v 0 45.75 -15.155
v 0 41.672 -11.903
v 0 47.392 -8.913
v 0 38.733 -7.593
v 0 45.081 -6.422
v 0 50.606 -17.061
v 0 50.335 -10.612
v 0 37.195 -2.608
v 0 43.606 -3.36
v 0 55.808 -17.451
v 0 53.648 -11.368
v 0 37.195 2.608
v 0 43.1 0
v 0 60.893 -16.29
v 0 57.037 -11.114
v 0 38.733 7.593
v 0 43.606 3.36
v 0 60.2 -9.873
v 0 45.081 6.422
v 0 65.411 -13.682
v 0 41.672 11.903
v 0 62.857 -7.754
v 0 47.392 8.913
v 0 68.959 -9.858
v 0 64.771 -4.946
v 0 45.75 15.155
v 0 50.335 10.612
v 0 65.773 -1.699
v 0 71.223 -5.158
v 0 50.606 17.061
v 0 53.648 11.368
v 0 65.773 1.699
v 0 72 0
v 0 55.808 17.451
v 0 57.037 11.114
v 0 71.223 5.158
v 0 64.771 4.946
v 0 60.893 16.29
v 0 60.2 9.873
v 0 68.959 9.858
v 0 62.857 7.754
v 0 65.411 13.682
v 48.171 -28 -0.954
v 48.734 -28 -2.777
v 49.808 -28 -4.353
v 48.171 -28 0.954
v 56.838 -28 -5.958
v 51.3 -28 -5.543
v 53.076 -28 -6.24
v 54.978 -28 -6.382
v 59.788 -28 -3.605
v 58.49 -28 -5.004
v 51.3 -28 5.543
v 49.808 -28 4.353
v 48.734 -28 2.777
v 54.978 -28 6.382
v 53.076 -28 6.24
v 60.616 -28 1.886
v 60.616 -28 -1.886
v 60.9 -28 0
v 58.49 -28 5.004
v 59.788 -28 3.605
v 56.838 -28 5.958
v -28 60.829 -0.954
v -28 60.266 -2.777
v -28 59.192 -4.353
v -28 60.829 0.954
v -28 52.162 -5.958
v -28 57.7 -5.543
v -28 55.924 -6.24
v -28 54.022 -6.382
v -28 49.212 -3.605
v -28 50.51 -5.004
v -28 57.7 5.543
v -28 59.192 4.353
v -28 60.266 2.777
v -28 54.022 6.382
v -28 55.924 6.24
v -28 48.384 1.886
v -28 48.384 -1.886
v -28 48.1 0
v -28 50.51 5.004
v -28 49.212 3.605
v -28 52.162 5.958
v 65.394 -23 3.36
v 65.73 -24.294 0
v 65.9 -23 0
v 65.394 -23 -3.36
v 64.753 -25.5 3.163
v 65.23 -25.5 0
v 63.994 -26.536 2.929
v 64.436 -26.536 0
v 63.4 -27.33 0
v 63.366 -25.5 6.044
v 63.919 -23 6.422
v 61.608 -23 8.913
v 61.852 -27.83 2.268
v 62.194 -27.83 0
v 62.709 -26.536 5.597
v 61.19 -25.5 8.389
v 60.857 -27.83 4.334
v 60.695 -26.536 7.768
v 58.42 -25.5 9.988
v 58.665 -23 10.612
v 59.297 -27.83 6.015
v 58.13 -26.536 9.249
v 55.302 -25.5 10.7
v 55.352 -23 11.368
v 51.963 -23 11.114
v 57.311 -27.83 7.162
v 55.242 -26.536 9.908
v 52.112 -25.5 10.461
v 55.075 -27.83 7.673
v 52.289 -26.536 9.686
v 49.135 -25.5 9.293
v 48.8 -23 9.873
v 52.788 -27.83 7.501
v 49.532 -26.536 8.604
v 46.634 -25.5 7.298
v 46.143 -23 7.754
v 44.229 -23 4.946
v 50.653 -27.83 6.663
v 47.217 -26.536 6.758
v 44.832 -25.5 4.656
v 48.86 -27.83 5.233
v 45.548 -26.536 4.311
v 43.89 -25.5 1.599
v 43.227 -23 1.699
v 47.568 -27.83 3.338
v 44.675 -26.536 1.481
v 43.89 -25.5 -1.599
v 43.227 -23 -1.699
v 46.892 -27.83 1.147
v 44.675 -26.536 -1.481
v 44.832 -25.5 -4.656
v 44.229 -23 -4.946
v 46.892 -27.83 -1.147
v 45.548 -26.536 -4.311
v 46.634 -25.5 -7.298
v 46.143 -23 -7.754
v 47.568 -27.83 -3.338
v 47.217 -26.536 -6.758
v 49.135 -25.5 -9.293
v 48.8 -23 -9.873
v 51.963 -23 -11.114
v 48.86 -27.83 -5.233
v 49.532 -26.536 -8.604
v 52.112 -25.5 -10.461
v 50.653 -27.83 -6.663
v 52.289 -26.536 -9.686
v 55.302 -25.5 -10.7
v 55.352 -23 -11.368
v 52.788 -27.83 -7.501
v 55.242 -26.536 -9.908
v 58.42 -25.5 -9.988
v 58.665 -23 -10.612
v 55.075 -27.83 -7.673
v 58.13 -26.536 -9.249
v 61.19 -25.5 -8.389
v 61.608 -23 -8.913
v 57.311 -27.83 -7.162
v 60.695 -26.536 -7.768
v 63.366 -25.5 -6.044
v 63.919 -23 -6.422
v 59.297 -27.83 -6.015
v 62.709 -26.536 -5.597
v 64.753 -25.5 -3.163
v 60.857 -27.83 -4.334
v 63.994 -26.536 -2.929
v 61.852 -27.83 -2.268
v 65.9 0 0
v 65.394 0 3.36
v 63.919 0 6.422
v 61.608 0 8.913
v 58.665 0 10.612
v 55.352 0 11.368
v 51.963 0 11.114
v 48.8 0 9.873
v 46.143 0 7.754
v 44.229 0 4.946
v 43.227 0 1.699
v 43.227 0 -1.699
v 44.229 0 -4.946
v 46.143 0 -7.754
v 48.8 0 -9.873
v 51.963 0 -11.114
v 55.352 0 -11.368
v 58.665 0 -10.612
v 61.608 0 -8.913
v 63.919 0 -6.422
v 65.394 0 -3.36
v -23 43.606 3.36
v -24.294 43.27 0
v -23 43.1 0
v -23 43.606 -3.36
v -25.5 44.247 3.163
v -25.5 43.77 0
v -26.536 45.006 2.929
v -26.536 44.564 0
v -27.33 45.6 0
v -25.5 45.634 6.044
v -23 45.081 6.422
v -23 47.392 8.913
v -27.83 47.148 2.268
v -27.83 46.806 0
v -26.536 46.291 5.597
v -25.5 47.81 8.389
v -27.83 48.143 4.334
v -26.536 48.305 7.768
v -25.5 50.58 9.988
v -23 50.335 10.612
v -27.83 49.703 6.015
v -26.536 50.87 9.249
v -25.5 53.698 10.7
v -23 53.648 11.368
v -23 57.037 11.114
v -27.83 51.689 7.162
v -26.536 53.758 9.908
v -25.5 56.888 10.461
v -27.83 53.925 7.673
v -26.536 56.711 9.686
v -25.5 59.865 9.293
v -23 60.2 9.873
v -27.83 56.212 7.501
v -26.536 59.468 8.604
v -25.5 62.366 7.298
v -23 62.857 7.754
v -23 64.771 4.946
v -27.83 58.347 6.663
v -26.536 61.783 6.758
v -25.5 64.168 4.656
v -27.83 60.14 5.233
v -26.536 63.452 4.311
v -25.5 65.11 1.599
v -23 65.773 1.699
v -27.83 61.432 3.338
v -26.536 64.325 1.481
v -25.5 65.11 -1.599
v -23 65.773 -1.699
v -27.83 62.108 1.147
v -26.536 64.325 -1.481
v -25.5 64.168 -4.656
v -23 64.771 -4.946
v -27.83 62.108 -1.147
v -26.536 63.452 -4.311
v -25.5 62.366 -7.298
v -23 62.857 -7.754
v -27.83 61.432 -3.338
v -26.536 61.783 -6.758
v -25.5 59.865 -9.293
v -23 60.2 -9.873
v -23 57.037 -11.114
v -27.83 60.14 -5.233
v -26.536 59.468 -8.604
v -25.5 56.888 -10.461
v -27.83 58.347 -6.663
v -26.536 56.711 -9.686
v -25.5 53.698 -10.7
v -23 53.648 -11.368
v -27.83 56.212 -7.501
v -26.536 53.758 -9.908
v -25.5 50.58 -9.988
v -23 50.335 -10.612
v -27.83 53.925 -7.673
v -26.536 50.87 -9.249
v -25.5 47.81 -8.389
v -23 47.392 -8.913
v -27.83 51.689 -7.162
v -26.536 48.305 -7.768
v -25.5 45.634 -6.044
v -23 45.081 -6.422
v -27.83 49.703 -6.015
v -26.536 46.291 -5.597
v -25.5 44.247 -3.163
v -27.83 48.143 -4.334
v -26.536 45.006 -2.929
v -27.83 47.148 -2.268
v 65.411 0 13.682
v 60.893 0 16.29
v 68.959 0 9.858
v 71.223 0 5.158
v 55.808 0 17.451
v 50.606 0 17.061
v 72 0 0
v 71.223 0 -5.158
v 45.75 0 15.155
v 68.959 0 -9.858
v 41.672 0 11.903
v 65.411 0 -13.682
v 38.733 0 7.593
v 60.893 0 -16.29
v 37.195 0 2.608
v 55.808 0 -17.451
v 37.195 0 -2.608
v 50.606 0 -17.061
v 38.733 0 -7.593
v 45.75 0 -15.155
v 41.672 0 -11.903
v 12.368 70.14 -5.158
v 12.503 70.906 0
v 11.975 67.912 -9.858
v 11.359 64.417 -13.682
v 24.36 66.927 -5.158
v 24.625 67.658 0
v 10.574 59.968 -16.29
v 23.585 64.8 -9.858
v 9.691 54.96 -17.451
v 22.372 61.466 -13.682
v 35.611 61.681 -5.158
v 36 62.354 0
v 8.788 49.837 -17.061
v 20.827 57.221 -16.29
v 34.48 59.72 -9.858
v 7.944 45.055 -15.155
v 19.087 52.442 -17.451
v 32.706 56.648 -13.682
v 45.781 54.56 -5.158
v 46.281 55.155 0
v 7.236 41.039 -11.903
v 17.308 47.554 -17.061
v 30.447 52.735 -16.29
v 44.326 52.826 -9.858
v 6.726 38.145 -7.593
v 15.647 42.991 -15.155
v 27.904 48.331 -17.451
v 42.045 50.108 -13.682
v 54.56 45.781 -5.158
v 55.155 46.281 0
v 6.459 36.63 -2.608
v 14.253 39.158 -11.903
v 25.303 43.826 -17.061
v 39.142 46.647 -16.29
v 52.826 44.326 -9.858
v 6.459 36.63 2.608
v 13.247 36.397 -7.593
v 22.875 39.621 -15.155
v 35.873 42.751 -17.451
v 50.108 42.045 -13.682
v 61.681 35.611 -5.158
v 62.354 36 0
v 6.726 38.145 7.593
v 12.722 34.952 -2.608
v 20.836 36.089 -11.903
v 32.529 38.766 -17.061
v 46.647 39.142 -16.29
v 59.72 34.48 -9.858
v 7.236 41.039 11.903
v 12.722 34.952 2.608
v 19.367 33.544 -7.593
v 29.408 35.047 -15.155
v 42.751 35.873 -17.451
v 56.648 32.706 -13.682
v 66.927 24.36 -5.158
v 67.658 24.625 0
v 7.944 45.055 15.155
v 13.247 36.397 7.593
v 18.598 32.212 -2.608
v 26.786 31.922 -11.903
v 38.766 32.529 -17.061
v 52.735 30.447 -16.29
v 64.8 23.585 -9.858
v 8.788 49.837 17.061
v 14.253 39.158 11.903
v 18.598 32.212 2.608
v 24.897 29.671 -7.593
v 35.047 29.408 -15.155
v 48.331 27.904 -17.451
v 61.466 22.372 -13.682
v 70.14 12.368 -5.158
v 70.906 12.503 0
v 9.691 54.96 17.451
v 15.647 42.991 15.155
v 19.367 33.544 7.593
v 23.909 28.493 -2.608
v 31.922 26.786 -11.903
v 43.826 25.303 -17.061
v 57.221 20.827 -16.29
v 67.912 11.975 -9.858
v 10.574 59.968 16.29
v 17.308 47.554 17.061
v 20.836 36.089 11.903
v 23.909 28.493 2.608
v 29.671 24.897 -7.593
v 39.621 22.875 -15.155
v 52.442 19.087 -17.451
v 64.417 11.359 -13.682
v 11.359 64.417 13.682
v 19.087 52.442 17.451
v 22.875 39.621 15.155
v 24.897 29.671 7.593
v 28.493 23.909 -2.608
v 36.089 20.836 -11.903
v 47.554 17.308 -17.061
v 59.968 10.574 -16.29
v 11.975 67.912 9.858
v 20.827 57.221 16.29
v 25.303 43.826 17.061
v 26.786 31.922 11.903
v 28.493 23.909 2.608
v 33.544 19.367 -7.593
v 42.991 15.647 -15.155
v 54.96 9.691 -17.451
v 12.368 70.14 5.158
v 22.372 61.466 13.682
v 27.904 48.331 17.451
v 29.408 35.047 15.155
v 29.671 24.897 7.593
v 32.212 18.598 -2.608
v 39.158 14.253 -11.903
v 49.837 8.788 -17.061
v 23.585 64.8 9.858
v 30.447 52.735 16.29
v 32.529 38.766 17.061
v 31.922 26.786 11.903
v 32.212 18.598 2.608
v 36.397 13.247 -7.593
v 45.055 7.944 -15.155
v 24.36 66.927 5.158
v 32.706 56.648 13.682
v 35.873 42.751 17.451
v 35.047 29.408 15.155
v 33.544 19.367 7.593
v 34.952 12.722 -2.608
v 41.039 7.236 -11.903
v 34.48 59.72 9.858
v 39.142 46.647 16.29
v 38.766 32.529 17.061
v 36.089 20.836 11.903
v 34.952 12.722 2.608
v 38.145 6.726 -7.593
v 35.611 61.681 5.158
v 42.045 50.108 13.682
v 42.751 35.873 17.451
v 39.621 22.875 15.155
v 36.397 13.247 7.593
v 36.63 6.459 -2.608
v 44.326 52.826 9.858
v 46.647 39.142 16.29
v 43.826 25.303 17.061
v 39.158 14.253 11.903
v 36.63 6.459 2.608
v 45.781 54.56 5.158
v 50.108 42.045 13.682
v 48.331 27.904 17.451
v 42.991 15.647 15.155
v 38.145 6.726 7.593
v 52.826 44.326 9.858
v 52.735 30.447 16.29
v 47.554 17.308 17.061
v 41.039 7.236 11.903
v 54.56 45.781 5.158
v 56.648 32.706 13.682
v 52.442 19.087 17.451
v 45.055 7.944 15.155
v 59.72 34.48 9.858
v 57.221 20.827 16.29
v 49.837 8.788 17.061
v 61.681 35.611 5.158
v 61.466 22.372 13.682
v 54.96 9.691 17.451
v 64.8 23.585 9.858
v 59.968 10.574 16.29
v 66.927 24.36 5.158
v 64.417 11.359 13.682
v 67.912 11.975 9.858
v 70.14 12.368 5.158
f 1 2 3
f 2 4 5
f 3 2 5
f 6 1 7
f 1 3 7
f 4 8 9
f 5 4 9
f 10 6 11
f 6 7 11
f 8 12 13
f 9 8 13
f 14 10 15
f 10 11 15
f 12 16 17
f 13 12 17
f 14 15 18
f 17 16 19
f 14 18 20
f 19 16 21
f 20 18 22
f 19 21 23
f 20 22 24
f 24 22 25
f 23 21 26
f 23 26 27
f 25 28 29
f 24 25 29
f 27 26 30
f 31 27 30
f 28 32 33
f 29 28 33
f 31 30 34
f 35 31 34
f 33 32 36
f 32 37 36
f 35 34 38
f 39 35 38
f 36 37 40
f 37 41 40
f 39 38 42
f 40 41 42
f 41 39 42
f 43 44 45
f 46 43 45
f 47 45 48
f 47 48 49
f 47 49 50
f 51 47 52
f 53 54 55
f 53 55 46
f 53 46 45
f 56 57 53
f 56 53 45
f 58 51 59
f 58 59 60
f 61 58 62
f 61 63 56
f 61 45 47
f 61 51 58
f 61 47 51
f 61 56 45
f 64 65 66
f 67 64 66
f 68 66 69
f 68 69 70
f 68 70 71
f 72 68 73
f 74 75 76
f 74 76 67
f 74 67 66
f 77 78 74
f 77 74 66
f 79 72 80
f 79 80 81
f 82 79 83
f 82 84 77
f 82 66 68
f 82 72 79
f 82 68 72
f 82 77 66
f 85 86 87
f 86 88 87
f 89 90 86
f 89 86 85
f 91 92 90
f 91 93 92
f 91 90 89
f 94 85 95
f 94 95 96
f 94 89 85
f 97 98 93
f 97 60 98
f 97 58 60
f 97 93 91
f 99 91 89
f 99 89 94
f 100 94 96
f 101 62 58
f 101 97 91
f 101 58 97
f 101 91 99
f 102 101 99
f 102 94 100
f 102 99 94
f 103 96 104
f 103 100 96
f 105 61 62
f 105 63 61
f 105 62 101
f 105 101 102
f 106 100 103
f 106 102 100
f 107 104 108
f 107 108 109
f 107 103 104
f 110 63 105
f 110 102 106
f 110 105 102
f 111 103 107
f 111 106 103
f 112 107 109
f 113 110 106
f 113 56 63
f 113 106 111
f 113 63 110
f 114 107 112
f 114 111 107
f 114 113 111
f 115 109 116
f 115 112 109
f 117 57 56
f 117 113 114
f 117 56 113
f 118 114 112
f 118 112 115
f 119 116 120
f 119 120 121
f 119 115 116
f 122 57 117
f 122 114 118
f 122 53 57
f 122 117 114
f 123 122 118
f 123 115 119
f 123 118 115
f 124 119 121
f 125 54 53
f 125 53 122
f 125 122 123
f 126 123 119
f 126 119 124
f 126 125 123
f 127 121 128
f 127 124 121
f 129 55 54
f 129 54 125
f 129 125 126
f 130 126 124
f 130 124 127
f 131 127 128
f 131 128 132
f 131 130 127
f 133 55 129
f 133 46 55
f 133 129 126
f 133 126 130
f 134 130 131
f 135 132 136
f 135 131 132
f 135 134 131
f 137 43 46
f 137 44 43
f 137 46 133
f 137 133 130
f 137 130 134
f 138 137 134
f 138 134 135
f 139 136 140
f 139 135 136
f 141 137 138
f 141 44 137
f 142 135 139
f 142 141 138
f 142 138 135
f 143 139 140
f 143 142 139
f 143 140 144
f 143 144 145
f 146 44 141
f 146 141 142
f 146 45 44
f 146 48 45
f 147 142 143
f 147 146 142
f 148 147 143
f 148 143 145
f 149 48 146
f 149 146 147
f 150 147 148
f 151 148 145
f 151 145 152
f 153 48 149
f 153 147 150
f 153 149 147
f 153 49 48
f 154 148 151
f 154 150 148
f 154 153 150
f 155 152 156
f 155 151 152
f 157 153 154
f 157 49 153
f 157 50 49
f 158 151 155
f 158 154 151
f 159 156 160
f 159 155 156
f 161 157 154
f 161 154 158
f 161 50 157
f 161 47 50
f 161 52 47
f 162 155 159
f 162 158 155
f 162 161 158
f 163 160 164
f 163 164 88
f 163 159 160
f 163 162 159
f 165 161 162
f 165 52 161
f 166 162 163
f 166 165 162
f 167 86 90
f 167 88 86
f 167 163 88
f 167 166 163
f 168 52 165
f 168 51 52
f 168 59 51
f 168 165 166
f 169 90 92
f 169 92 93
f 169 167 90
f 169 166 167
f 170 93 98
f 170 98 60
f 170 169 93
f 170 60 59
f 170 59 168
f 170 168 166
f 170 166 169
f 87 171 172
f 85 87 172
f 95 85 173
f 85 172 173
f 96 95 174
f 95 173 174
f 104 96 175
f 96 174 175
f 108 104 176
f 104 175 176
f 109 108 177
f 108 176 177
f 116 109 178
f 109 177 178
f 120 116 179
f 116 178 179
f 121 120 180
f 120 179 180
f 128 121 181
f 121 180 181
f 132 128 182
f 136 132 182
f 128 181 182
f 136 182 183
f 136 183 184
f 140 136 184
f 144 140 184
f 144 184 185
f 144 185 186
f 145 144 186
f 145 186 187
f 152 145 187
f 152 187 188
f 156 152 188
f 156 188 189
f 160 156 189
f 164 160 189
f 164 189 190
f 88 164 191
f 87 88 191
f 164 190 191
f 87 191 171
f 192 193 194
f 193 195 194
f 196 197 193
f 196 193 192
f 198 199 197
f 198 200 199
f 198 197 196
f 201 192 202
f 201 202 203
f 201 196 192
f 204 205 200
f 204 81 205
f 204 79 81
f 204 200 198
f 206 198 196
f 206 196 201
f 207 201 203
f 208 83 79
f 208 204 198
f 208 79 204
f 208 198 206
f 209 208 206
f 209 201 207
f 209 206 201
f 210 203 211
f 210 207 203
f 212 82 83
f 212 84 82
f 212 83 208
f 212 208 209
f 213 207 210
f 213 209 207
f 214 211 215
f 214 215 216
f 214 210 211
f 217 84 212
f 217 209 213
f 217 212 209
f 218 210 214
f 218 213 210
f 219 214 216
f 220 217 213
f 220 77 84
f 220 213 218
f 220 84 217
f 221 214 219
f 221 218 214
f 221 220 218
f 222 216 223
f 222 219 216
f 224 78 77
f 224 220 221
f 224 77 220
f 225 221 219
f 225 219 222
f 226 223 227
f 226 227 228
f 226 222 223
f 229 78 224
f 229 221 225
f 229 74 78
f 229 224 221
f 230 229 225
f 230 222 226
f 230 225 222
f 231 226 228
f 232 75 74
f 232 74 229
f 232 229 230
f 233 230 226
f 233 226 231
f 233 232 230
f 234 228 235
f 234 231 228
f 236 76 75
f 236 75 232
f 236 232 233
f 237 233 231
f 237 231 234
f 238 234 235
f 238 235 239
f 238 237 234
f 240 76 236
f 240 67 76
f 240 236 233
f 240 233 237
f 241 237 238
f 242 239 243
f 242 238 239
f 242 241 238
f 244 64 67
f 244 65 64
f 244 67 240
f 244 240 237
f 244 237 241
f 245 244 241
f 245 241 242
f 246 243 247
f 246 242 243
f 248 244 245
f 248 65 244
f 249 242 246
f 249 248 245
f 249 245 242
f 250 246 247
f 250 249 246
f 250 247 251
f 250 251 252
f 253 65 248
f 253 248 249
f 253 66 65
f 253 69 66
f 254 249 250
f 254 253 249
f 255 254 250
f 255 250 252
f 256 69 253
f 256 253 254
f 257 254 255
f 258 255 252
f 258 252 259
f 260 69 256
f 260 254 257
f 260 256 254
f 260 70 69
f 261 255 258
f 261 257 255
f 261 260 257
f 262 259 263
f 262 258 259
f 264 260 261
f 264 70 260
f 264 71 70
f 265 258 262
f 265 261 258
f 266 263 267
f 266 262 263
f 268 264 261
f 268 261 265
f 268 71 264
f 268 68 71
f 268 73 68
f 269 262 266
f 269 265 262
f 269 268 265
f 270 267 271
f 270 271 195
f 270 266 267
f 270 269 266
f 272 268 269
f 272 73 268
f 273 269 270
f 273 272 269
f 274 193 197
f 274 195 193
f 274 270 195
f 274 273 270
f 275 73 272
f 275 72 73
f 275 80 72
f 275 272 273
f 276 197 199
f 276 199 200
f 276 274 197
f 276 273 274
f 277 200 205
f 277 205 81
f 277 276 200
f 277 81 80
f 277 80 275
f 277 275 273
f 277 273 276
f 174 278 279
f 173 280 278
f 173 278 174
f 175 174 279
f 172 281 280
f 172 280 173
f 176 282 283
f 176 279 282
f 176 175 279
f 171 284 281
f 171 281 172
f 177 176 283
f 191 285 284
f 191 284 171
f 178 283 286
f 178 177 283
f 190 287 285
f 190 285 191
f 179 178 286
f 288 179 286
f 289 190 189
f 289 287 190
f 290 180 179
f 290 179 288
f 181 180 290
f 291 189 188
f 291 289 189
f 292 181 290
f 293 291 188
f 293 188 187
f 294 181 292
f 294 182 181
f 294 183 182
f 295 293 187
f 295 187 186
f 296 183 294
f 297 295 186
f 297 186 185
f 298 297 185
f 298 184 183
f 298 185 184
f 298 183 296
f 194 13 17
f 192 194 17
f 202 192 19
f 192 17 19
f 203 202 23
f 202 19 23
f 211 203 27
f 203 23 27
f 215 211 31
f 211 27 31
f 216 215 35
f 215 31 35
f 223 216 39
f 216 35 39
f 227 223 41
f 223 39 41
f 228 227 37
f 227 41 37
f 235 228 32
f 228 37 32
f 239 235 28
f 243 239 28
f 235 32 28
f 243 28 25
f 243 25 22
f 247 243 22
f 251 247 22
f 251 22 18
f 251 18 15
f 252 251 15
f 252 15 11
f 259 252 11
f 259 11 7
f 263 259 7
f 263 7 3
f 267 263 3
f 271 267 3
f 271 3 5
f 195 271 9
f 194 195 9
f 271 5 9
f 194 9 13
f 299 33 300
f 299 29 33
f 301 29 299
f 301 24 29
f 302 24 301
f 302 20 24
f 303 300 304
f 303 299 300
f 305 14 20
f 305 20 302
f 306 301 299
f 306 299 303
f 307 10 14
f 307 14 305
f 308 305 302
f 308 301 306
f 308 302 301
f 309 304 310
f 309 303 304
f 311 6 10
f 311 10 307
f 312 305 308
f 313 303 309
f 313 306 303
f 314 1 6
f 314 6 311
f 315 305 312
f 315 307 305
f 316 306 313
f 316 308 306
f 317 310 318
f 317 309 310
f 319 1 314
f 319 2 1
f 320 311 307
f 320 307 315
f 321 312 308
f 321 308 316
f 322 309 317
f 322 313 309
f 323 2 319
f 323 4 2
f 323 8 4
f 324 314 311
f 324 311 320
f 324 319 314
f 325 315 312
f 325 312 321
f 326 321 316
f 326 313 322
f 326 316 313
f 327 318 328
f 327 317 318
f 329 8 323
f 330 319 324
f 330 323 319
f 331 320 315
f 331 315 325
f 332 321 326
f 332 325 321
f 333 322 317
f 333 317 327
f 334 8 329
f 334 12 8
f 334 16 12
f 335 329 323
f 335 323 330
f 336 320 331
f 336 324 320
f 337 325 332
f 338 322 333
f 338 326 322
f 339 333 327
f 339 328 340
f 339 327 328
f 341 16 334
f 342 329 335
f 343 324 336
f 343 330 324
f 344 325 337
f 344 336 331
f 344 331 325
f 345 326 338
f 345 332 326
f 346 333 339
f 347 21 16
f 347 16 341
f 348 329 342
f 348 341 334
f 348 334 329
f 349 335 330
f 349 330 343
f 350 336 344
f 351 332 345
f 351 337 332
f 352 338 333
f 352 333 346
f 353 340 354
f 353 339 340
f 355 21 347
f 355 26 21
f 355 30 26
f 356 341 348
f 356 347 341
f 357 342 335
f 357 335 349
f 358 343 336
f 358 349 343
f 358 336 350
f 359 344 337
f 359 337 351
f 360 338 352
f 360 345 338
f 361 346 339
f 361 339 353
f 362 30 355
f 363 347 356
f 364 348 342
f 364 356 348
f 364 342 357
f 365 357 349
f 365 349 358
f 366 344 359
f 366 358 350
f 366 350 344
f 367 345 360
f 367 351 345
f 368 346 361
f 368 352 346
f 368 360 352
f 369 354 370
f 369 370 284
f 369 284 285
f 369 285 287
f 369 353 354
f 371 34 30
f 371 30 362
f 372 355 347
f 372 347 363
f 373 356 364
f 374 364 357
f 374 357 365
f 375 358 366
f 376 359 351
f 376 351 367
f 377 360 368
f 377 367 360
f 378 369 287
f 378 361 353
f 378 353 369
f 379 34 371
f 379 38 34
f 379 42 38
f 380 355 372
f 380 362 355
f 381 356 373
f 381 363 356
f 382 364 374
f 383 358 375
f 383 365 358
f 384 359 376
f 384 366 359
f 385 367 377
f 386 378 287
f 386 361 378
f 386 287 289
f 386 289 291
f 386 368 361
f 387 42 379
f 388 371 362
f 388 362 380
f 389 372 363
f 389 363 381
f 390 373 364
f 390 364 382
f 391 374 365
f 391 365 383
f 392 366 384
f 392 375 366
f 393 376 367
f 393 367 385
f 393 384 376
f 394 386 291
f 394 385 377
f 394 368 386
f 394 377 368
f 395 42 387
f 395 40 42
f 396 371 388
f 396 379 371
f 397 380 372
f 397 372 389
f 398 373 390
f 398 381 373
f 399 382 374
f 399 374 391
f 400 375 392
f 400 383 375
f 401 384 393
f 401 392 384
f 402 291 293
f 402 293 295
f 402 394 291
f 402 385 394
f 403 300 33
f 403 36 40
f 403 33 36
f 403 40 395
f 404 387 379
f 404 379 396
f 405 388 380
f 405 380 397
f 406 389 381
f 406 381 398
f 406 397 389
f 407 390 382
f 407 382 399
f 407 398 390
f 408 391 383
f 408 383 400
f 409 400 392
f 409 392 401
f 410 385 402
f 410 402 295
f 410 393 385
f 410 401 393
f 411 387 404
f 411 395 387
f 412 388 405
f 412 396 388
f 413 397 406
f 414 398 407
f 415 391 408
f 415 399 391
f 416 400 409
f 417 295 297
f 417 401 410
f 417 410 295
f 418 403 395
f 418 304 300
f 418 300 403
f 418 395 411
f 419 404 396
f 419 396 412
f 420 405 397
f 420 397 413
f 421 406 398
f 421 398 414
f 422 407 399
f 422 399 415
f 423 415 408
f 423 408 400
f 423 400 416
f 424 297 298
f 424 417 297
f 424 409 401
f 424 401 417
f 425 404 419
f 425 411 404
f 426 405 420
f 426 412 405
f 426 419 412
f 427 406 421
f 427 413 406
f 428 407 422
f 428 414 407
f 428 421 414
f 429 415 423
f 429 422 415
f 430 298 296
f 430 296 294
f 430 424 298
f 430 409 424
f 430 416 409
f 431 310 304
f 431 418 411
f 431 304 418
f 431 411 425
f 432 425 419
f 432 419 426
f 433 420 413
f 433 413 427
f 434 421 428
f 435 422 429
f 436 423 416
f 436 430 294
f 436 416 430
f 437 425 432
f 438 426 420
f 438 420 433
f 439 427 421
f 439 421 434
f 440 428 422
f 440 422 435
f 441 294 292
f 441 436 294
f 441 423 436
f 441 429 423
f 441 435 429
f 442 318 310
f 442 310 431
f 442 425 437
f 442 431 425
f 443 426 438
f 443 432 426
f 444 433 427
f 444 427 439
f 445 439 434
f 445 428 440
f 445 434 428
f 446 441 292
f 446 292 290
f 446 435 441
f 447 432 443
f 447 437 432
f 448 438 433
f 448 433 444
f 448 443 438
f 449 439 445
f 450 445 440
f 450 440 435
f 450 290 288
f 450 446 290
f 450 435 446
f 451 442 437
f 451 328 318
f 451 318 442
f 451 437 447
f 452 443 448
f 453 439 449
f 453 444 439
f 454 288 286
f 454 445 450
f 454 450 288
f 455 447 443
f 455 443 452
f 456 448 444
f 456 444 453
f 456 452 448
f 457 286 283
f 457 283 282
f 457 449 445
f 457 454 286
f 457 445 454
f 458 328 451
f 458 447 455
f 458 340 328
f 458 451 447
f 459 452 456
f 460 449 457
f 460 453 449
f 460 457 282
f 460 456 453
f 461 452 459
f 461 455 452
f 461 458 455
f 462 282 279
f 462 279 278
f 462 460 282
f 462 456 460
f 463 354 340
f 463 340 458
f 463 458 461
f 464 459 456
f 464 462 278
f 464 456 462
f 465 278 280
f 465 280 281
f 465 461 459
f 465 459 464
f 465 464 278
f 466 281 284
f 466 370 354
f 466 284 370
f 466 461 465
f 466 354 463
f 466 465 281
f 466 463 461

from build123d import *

# Parameters (mm, degrees)
F1_R     = 17.5
F3_R     = 11.4
F4_DEPTH = 28
F5_R     = 11.4
F6_DEPTH = 28
F7_R     = 5
F8_R     = 5


with BuildPart() as f2:
    # F2: sweep along a path in F0
    with BuildLine(Plane.XY) as f2_path:
        ThreePointArc((0, 54.5), (38.5373195747, 38.5373195747), (54.5, 0))
    # F1 (on Right) → F2 (sweep)
    with BuildSketch(Plane.YZ):
        with Locations((54.5, 0)):
            Circle(F1_R)
    sweep(path=f2_path.line)

    # F3 (on face) → F4 (join)
    with BuildSketch(Plane.XZ):
        with Locations((54.5, 0)):
            Circle(F3_R)
    extrude(amount=F4_DEPTH)

    # F5 (on face) → F6 (join)
    with BuildSketch(Plane(origin=(0, 0, 0), x_dir=(0, -1, 0), z_dir=(-1, 0, 0))):
        with Locations((-54.5, 0)):
            Circle(F5_R)
    extrude(amount=F6_DEPTH)

    # F7
    f7_edges = [f2.edges().sort_by_distance(p)[0] for p in [
        (43.1, -28, 0),
    ]]
    fillet(f7_edges, radius=F7_R)

    # F8
    f8_edges = [f2.edges().sort_by_distance(p)[0] for p in [
        (-28, 65.9, 0),
    ]]
    fillet(f8_edges, radius=F8_R)


solid = f2.part
